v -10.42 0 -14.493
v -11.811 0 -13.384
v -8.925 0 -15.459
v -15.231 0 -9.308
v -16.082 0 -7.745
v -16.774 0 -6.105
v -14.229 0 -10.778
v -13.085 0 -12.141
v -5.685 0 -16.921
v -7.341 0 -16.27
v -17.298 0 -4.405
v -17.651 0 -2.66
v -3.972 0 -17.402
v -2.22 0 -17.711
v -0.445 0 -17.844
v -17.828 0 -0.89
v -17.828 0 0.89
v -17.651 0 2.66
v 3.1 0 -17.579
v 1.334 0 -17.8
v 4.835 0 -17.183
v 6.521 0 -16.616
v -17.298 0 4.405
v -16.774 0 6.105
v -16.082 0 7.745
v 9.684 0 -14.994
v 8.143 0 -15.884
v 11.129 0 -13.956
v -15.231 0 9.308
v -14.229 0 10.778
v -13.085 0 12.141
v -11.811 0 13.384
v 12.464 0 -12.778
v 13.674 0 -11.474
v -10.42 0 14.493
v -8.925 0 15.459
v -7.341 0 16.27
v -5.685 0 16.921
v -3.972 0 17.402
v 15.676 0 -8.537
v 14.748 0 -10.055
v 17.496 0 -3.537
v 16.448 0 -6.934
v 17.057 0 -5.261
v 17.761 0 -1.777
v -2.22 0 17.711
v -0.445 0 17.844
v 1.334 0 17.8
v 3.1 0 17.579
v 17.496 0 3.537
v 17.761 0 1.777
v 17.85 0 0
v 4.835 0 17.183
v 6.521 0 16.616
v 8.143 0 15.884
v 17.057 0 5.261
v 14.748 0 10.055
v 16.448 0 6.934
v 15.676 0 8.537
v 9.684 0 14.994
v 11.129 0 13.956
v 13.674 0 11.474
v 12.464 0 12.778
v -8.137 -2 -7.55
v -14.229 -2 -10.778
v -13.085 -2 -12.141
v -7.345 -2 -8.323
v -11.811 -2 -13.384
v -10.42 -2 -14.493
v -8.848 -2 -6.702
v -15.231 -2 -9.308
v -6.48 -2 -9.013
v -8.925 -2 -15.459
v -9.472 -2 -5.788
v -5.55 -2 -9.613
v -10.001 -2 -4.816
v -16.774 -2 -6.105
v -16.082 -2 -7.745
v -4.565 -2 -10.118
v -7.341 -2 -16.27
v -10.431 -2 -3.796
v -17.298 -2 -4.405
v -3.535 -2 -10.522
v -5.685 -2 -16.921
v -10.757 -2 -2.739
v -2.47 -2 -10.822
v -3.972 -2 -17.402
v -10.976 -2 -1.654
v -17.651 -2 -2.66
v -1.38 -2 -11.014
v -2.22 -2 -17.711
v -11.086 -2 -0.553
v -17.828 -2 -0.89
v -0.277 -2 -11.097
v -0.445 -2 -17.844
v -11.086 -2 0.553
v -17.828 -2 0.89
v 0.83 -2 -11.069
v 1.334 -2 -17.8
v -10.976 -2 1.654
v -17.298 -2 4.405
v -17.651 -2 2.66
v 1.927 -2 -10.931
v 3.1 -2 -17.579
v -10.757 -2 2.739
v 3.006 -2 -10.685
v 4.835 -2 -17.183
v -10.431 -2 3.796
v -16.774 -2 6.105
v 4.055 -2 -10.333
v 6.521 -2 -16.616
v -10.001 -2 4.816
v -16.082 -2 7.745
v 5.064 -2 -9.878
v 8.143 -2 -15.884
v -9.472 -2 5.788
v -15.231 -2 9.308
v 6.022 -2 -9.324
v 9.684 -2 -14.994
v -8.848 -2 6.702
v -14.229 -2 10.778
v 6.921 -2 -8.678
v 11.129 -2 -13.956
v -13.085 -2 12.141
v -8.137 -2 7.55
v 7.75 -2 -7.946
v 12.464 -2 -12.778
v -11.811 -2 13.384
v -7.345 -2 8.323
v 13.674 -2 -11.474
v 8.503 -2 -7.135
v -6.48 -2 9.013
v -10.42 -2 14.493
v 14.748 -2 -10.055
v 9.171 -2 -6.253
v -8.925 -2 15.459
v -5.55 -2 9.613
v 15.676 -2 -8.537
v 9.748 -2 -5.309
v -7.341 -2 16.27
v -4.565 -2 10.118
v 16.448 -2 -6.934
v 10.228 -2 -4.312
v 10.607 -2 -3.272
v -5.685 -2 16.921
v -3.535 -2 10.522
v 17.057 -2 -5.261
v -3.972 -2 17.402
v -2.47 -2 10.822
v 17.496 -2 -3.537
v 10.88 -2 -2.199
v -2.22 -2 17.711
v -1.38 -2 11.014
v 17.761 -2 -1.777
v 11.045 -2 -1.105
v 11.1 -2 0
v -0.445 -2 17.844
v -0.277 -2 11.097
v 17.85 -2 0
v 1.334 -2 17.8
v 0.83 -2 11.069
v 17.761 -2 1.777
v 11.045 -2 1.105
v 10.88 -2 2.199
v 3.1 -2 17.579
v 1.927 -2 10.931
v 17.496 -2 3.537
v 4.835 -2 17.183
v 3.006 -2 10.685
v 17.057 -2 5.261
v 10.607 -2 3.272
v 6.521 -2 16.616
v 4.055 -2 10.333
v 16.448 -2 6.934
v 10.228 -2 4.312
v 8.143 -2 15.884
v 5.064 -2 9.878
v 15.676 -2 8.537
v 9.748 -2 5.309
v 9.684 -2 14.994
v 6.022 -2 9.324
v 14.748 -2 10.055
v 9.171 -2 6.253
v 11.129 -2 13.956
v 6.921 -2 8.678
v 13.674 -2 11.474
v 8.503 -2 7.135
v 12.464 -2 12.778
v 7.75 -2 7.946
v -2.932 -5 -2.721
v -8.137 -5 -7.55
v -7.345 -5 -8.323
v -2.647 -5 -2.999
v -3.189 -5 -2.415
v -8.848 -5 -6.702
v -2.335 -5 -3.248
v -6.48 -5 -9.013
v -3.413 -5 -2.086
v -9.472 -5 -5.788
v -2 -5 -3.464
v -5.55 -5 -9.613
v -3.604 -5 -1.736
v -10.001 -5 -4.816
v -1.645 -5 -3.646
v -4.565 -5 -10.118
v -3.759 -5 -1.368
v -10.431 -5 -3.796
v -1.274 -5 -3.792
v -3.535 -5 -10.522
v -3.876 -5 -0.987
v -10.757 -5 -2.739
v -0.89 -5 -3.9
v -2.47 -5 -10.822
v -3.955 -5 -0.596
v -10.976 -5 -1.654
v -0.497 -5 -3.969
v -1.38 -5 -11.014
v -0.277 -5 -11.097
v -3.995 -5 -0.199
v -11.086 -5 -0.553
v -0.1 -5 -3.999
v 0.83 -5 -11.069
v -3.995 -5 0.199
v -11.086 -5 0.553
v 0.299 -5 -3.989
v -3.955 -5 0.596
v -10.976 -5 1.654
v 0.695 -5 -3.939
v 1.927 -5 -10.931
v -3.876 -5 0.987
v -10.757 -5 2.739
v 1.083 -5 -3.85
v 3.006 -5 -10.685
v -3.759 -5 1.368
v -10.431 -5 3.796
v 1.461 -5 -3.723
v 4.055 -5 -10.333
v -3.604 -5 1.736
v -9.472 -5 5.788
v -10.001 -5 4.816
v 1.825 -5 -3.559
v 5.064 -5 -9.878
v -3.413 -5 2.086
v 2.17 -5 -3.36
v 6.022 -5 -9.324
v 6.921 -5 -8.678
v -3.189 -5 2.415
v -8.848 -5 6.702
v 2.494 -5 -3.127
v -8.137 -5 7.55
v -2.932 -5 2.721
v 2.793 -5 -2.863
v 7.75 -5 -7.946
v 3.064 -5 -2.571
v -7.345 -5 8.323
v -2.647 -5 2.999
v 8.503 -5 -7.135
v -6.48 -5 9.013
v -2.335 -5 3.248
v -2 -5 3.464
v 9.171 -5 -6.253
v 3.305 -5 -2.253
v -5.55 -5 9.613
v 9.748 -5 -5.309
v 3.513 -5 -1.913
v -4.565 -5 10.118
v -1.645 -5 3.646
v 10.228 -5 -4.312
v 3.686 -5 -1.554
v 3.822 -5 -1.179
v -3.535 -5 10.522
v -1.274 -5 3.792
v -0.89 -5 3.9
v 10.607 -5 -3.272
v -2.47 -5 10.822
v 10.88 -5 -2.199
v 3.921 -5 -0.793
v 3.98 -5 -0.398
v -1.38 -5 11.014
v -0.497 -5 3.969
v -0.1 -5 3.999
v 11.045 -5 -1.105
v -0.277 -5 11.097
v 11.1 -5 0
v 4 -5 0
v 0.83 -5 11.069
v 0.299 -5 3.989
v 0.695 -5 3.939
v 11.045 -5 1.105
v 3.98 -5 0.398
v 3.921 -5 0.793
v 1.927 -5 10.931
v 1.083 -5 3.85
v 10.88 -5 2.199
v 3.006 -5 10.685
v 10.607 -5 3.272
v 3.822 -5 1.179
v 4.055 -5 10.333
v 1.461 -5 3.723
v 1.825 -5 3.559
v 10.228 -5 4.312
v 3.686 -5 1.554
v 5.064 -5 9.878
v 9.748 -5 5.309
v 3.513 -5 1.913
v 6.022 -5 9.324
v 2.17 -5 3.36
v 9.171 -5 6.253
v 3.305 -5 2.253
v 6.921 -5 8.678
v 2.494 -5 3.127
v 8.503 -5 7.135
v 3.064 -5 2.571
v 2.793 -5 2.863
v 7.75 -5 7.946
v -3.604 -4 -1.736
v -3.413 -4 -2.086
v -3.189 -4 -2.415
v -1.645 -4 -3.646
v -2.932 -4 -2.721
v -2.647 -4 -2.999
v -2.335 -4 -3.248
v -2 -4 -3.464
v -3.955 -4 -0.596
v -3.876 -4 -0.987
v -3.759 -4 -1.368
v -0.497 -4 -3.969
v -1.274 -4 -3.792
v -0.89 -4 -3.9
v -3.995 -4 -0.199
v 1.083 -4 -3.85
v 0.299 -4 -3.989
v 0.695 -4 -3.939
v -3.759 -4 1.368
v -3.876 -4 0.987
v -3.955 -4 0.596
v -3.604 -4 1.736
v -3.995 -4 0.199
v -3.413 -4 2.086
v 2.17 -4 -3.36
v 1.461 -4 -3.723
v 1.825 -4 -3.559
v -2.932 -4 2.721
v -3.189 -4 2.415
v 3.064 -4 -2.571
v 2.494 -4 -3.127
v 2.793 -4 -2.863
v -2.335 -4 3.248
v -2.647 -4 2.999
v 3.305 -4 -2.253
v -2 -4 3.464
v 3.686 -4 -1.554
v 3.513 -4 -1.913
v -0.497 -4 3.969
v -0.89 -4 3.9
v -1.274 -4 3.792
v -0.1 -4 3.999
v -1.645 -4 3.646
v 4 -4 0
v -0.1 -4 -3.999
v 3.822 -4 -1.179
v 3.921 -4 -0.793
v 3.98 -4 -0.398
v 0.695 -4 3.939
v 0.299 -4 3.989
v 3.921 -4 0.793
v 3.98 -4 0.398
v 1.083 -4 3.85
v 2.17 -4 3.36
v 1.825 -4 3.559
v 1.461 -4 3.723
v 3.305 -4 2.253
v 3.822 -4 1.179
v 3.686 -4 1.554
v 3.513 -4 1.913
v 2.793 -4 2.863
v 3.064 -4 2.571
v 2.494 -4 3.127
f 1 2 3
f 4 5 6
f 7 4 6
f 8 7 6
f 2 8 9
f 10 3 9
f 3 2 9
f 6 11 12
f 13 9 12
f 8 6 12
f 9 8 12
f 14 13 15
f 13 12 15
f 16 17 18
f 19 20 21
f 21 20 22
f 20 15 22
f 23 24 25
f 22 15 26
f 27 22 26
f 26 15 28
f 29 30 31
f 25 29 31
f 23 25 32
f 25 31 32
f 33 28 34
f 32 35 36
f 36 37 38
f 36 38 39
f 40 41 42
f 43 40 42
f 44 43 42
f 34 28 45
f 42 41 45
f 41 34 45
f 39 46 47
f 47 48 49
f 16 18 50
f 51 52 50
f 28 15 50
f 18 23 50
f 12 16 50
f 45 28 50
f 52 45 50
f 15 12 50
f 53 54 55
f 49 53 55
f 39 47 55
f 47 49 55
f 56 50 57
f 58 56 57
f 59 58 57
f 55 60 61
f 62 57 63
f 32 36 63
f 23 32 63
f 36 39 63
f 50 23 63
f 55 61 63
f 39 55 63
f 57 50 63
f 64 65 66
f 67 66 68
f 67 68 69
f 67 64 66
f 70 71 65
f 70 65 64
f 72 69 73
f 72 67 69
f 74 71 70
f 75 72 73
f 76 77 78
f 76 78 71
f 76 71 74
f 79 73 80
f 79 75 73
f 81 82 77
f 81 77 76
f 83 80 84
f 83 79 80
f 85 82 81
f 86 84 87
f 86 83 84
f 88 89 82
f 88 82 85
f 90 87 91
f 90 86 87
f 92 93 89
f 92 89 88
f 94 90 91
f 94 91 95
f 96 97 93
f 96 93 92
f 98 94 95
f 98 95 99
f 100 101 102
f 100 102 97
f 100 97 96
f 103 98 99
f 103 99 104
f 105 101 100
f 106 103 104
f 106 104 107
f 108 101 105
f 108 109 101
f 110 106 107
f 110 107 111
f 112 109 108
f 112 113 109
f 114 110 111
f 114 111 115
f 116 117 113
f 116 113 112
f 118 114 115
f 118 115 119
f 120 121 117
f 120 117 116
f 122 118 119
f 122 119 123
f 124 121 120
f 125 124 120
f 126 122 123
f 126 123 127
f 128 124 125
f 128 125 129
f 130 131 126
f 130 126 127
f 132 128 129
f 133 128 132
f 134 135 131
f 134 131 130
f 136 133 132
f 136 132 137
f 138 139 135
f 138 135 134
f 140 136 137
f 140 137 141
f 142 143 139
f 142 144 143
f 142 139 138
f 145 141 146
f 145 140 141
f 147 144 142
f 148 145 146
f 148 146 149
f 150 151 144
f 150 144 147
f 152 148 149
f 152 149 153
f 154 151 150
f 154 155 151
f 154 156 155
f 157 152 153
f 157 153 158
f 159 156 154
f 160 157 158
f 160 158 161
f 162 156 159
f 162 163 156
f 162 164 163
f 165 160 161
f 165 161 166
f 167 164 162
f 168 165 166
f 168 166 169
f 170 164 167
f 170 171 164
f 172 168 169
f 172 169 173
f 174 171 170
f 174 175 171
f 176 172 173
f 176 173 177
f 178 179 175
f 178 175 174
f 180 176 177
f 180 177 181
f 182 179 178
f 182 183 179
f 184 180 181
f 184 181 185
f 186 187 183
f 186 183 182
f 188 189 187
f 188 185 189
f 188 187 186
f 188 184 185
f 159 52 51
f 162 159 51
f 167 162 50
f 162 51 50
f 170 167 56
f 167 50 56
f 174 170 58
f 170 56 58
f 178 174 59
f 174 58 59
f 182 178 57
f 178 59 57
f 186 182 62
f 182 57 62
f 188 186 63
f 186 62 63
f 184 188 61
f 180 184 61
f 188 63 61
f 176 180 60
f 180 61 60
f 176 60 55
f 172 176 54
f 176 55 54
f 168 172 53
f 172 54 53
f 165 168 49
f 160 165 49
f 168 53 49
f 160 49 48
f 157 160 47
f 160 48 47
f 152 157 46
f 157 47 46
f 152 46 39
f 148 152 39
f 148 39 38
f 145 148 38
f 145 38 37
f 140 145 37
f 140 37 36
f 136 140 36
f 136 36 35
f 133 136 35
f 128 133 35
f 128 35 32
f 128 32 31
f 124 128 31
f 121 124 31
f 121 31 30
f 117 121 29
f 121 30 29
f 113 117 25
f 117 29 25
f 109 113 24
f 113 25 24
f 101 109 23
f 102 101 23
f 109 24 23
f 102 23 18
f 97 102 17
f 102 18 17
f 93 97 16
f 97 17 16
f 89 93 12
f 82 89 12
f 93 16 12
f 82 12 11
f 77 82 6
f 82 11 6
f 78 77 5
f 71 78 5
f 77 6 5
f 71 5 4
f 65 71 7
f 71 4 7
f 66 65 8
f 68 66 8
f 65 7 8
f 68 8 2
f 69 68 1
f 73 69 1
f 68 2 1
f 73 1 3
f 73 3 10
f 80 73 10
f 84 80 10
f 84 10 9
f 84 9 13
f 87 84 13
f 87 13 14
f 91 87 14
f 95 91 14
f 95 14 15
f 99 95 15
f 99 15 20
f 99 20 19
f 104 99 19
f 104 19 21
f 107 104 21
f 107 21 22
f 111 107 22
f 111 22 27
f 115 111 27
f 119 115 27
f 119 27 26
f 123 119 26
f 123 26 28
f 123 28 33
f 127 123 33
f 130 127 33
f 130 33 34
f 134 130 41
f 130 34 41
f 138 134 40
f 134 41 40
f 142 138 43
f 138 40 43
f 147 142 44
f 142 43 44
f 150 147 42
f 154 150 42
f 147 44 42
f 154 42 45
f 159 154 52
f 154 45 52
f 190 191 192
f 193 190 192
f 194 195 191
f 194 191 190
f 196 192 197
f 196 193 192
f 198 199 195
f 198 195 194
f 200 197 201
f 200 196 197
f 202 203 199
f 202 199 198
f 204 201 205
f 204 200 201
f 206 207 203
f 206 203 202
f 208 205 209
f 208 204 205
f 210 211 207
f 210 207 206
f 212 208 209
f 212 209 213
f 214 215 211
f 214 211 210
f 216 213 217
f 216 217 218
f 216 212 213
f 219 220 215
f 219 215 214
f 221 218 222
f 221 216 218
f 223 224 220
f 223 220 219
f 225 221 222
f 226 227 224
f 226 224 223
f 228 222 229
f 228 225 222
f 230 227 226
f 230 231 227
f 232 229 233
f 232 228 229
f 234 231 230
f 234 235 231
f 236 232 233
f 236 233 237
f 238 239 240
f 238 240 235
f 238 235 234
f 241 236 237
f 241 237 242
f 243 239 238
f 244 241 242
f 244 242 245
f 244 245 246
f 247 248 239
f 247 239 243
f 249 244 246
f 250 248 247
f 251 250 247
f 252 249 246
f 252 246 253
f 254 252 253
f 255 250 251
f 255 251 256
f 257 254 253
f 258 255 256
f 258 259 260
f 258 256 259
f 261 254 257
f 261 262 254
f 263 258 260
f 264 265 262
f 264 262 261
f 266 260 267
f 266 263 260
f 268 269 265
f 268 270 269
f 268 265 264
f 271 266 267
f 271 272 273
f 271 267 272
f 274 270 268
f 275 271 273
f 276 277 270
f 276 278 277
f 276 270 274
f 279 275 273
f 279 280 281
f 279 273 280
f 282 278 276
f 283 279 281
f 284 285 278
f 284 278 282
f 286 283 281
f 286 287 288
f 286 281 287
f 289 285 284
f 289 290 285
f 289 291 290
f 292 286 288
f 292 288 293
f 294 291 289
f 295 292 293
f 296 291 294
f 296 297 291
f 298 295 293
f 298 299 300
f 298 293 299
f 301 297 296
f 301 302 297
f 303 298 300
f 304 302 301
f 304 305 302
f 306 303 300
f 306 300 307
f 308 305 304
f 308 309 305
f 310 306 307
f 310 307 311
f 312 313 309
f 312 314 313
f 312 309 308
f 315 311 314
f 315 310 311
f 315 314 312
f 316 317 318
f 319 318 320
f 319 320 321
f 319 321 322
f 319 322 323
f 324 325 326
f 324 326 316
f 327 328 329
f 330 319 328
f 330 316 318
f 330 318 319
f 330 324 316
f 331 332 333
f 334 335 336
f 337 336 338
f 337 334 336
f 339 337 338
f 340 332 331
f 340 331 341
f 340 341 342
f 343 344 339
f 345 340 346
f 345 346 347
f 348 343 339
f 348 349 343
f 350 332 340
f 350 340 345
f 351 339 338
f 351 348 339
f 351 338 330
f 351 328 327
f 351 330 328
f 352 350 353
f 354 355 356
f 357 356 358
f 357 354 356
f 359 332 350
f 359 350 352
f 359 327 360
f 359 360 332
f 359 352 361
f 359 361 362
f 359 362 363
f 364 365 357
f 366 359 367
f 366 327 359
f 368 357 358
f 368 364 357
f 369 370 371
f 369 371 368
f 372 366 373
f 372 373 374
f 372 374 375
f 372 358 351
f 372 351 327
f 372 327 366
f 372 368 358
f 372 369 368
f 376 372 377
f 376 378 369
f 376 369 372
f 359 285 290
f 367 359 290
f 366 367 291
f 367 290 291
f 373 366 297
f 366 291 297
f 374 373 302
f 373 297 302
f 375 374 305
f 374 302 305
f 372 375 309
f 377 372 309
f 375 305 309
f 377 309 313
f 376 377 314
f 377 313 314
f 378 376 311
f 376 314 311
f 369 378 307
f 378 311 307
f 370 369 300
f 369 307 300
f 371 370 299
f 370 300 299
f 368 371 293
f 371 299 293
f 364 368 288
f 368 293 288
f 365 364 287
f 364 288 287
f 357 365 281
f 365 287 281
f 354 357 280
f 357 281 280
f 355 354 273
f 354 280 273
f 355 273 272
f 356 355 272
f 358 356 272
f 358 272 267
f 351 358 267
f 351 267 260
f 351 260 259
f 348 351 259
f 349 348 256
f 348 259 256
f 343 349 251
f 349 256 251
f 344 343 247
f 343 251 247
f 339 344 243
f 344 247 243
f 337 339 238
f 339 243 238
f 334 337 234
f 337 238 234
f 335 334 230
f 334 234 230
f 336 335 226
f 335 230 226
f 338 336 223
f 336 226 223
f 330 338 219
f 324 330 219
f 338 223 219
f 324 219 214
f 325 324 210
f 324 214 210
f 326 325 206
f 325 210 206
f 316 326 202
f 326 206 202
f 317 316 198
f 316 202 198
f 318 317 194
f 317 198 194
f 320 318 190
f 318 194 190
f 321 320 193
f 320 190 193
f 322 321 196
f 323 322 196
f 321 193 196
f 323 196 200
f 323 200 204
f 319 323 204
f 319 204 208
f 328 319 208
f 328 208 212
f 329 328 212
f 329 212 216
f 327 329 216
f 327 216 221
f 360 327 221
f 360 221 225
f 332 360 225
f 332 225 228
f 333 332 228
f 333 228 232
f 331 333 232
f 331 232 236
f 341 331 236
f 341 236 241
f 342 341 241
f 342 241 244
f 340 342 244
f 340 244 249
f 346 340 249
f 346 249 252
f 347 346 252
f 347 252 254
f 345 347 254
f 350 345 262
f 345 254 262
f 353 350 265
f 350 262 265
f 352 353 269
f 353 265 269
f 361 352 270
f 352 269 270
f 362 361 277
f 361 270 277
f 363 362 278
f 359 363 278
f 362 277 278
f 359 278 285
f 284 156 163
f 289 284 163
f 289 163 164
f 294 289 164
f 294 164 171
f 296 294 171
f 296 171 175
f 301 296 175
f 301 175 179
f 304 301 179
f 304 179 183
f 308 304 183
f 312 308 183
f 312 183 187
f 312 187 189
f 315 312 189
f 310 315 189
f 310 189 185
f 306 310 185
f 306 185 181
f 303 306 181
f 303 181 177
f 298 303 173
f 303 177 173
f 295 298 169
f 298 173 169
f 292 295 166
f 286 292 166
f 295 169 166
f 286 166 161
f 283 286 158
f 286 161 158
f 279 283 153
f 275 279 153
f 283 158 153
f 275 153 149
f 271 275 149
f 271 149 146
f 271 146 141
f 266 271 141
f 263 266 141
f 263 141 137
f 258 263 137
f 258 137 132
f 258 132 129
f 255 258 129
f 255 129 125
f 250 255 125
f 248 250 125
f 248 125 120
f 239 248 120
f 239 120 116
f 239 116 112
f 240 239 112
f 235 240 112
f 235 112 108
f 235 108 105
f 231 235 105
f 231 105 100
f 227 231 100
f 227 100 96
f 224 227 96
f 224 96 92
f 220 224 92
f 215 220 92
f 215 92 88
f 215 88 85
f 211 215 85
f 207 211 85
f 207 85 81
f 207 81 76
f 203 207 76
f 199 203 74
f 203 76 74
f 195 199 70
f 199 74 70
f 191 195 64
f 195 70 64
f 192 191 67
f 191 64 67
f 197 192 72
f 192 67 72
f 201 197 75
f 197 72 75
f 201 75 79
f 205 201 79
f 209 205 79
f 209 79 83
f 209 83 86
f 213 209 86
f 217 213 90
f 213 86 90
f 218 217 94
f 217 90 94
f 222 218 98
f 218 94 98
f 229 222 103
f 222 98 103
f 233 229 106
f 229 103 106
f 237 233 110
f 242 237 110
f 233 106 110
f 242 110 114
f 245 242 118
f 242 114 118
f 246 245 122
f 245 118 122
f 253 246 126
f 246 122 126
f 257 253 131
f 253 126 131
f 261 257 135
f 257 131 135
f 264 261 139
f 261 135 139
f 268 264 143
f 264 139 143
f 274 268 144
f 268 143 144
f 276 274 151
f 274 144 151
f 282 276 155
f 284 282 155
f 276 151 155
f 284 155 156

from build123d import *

# Parameters (mm, degrees)
F0_R     = 11.1
F0_R_2   = 17.85
F1_DEPTH = 2
F2_DEPTH = 5
F3_R     = 4
F4_DEPTH = 1


with BuildPart() as f1:
    # F0 (on Front) → F1 (new body)
    with BuildSketch(Plane.XZ):
        Circle(F0_R)
        Circle(F0_R_2)
        Circle(F0_R, mode=Mode.SUBTRACT)
    extrude(amount=F1_DEPTH)

    # F0 (on Front) → F2 (join)
    with BuildSketch(Plane.XZ):
        Circle(F0_R)
    extrude(amount=F2_DEPTH)

    # F3 (on face) → F4 (cut)
    with BuildSketch(Plane.XZ.offset(5)):
        Circle(F3_R)
    extrude(amount=-F4_DEPTH, mode=Mode.SUBTRACT)


solid = f1.part
